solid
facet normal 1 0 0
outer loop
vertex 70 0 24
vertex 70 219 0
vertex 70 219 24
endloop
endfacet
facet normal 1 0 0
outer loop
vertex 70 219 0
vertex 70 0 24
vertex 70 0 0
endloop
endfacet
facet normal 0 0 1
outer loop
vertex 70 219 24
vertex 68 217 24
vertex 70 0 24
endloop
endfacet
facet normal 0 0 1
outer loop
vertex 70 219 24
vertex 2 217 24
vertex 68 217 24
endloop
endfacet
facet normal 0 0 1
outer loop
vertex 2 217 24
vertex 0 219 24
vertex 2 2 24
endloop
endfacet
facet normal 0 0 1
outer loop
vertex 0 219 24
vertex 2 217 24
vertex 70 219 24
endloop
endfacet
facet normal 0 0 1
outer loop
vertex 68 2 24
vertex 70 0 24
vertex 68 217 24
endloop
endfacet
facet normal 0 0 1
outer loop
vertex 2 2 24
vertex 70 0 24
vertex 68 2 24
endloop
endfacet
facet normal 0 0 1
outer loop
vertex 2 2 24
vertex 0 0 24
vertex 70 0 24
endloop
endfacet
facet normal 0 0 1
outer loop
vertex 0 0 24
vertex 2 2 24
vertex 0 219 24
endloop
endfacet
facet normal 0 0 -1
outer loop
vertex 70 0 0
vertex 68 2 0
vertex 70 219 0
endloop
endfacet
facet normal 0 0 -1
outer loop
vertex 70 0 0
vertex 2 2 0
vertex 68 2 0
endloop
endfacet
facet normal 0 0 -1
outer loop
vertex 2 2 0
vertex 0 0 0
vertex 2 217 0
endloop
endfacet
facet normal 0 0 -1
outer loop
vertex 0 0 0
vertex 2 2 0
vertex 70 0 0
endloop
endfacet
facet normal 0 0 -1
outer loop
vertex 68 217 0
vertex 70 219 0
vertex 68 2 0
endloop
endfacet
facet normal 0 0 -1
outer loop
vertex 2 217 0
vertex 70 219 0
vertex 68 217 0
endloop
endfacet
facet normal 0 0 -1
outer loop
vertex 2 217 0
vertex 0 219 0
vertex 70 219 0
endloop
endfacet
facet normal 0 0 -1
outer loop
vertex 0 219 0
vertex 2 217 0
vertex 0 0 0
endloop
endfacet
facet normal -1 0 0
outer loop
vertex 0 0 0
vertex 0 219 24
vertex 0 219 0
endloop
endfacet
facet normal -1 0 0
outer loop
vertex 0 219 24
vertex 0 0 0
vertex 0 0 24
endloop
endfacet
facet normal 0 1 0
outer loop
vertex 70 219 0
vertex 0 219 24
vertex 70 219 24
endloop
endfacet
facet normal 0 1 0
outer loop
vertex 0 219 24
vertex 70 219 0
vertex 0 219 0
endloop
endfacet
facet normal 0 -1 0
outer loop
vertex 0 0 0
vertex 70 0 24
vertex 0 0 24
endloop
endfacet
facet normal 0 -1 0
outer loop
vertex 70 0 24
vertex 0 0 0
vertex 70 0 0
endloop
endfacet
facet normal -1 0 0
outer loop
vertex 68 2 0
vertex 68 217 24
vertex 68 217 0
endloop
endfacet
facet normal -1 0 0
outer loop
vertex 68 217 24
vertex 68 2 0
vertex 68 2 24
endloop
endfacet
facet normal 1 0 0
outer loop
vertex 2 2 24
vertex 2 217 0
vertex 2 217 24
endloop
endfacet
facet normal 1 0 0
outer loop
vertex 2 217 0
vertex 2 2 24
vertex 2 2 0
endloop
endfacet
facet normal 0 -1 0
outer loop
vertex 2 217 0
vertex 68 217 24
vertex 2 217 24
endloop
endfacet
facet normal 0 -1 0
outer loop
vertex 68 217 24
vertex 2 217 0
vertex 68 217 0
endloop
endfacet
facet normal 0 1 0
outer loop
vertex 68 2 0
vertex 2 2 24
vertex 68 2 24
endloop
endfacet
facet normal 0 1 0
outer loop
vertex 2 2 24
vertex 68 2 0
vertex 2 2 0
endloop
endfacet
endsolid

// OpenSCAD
insert_font = "Futura:style=Medium";
include <../../The-Boardgame-Insert-Toolkit/boardgame_insert_toolkit_lib.2.scad>;
include <../../BFD-Insert-Extensions/InsertExtensions.scad>;

$fn = 100;


// Used to visualize how all of the boxes fit together. 
//g_b_visualization = true;          
        
// this is the outer wall thickness. 
//Default = 1.5mm
g_wall_thickness = 2.0;
g_lid_thickness = 2.0;
g_min_bottom_thickness = 1.0;


// The tolerance value is extra space put between planes of the lid and box that fit together.
// Increase the tolerance to loosen the fit and decrease it to tighten it.
//
// Note that the tolerance is applied exclusivelysto the lid.
// So if the lid is too tight or too loose, change this value ( up for looser fit, down for tighter fit ) and 
// you only need to reprint the lid.
// 
// The exception is the stackable box, where the bottom of the box is the lid of the box below,
// in which case the tolerance also affects that box bottom.
//
g_tolerance = 0.15;
g_detent_thickness = 0.25;

// This adjusts the position of the lid detents downward. 
// The larger the value, the bigger the gap between the lid and the box.
g_tolerance_detents_pos = 0.1;

card_sizes = [[73,74]];
card_width = 73;
card_height = 74;


function boxOne() = gridBox( "Box One", [3,1], ["BARRACKS"], 24, 0, 73, 74, 20, stack="", true , padding = [1,1]);
  
function boxTwo() = 
 [   "Box Two",
        [
            [ BOX_SIZE_XYZ,                                     [225, 78, 22] ],
            boxLid(["EMPERORS"], 24, 0, 12),
            squareCompartmentGrid([1,1],73,74,20,t,padding=[1,1],position=[0,0],cutout_pct = 50), 
            squareCompartmentGrid([1,1],73,74,20,t,padding=[1,1],position=[73+73+2,0],cutout_pct = 50),
            squareCompartmentGrid([3,1],16.5,16.5,2,f,cutout_sides = [t,f,f,f],padding=[6.6255,6.625],position=[73+6.625,0],cutout_pct = 50,side_cutout_height_pct = 15),
            squareCompartmentGrid([3,1],16.5,16.5,2,f,cutout_sides = [f,t,f,f],padding=[6.6255,6.625],position=[73+6.625,57.5],cutout_pct = 50,side_cutout_height_pct = 15)
        ]
 ];
// Focus on one box
g_isolated_print_box = "spacer1"; 
g_b_print_lid = false;
g_b_print_box = true;   
  
data =
[ 
    boxOne(),
    boxTwo(),
    spacer("spacer1",70,219,24),
];

//echo(data);
MakeAll();
